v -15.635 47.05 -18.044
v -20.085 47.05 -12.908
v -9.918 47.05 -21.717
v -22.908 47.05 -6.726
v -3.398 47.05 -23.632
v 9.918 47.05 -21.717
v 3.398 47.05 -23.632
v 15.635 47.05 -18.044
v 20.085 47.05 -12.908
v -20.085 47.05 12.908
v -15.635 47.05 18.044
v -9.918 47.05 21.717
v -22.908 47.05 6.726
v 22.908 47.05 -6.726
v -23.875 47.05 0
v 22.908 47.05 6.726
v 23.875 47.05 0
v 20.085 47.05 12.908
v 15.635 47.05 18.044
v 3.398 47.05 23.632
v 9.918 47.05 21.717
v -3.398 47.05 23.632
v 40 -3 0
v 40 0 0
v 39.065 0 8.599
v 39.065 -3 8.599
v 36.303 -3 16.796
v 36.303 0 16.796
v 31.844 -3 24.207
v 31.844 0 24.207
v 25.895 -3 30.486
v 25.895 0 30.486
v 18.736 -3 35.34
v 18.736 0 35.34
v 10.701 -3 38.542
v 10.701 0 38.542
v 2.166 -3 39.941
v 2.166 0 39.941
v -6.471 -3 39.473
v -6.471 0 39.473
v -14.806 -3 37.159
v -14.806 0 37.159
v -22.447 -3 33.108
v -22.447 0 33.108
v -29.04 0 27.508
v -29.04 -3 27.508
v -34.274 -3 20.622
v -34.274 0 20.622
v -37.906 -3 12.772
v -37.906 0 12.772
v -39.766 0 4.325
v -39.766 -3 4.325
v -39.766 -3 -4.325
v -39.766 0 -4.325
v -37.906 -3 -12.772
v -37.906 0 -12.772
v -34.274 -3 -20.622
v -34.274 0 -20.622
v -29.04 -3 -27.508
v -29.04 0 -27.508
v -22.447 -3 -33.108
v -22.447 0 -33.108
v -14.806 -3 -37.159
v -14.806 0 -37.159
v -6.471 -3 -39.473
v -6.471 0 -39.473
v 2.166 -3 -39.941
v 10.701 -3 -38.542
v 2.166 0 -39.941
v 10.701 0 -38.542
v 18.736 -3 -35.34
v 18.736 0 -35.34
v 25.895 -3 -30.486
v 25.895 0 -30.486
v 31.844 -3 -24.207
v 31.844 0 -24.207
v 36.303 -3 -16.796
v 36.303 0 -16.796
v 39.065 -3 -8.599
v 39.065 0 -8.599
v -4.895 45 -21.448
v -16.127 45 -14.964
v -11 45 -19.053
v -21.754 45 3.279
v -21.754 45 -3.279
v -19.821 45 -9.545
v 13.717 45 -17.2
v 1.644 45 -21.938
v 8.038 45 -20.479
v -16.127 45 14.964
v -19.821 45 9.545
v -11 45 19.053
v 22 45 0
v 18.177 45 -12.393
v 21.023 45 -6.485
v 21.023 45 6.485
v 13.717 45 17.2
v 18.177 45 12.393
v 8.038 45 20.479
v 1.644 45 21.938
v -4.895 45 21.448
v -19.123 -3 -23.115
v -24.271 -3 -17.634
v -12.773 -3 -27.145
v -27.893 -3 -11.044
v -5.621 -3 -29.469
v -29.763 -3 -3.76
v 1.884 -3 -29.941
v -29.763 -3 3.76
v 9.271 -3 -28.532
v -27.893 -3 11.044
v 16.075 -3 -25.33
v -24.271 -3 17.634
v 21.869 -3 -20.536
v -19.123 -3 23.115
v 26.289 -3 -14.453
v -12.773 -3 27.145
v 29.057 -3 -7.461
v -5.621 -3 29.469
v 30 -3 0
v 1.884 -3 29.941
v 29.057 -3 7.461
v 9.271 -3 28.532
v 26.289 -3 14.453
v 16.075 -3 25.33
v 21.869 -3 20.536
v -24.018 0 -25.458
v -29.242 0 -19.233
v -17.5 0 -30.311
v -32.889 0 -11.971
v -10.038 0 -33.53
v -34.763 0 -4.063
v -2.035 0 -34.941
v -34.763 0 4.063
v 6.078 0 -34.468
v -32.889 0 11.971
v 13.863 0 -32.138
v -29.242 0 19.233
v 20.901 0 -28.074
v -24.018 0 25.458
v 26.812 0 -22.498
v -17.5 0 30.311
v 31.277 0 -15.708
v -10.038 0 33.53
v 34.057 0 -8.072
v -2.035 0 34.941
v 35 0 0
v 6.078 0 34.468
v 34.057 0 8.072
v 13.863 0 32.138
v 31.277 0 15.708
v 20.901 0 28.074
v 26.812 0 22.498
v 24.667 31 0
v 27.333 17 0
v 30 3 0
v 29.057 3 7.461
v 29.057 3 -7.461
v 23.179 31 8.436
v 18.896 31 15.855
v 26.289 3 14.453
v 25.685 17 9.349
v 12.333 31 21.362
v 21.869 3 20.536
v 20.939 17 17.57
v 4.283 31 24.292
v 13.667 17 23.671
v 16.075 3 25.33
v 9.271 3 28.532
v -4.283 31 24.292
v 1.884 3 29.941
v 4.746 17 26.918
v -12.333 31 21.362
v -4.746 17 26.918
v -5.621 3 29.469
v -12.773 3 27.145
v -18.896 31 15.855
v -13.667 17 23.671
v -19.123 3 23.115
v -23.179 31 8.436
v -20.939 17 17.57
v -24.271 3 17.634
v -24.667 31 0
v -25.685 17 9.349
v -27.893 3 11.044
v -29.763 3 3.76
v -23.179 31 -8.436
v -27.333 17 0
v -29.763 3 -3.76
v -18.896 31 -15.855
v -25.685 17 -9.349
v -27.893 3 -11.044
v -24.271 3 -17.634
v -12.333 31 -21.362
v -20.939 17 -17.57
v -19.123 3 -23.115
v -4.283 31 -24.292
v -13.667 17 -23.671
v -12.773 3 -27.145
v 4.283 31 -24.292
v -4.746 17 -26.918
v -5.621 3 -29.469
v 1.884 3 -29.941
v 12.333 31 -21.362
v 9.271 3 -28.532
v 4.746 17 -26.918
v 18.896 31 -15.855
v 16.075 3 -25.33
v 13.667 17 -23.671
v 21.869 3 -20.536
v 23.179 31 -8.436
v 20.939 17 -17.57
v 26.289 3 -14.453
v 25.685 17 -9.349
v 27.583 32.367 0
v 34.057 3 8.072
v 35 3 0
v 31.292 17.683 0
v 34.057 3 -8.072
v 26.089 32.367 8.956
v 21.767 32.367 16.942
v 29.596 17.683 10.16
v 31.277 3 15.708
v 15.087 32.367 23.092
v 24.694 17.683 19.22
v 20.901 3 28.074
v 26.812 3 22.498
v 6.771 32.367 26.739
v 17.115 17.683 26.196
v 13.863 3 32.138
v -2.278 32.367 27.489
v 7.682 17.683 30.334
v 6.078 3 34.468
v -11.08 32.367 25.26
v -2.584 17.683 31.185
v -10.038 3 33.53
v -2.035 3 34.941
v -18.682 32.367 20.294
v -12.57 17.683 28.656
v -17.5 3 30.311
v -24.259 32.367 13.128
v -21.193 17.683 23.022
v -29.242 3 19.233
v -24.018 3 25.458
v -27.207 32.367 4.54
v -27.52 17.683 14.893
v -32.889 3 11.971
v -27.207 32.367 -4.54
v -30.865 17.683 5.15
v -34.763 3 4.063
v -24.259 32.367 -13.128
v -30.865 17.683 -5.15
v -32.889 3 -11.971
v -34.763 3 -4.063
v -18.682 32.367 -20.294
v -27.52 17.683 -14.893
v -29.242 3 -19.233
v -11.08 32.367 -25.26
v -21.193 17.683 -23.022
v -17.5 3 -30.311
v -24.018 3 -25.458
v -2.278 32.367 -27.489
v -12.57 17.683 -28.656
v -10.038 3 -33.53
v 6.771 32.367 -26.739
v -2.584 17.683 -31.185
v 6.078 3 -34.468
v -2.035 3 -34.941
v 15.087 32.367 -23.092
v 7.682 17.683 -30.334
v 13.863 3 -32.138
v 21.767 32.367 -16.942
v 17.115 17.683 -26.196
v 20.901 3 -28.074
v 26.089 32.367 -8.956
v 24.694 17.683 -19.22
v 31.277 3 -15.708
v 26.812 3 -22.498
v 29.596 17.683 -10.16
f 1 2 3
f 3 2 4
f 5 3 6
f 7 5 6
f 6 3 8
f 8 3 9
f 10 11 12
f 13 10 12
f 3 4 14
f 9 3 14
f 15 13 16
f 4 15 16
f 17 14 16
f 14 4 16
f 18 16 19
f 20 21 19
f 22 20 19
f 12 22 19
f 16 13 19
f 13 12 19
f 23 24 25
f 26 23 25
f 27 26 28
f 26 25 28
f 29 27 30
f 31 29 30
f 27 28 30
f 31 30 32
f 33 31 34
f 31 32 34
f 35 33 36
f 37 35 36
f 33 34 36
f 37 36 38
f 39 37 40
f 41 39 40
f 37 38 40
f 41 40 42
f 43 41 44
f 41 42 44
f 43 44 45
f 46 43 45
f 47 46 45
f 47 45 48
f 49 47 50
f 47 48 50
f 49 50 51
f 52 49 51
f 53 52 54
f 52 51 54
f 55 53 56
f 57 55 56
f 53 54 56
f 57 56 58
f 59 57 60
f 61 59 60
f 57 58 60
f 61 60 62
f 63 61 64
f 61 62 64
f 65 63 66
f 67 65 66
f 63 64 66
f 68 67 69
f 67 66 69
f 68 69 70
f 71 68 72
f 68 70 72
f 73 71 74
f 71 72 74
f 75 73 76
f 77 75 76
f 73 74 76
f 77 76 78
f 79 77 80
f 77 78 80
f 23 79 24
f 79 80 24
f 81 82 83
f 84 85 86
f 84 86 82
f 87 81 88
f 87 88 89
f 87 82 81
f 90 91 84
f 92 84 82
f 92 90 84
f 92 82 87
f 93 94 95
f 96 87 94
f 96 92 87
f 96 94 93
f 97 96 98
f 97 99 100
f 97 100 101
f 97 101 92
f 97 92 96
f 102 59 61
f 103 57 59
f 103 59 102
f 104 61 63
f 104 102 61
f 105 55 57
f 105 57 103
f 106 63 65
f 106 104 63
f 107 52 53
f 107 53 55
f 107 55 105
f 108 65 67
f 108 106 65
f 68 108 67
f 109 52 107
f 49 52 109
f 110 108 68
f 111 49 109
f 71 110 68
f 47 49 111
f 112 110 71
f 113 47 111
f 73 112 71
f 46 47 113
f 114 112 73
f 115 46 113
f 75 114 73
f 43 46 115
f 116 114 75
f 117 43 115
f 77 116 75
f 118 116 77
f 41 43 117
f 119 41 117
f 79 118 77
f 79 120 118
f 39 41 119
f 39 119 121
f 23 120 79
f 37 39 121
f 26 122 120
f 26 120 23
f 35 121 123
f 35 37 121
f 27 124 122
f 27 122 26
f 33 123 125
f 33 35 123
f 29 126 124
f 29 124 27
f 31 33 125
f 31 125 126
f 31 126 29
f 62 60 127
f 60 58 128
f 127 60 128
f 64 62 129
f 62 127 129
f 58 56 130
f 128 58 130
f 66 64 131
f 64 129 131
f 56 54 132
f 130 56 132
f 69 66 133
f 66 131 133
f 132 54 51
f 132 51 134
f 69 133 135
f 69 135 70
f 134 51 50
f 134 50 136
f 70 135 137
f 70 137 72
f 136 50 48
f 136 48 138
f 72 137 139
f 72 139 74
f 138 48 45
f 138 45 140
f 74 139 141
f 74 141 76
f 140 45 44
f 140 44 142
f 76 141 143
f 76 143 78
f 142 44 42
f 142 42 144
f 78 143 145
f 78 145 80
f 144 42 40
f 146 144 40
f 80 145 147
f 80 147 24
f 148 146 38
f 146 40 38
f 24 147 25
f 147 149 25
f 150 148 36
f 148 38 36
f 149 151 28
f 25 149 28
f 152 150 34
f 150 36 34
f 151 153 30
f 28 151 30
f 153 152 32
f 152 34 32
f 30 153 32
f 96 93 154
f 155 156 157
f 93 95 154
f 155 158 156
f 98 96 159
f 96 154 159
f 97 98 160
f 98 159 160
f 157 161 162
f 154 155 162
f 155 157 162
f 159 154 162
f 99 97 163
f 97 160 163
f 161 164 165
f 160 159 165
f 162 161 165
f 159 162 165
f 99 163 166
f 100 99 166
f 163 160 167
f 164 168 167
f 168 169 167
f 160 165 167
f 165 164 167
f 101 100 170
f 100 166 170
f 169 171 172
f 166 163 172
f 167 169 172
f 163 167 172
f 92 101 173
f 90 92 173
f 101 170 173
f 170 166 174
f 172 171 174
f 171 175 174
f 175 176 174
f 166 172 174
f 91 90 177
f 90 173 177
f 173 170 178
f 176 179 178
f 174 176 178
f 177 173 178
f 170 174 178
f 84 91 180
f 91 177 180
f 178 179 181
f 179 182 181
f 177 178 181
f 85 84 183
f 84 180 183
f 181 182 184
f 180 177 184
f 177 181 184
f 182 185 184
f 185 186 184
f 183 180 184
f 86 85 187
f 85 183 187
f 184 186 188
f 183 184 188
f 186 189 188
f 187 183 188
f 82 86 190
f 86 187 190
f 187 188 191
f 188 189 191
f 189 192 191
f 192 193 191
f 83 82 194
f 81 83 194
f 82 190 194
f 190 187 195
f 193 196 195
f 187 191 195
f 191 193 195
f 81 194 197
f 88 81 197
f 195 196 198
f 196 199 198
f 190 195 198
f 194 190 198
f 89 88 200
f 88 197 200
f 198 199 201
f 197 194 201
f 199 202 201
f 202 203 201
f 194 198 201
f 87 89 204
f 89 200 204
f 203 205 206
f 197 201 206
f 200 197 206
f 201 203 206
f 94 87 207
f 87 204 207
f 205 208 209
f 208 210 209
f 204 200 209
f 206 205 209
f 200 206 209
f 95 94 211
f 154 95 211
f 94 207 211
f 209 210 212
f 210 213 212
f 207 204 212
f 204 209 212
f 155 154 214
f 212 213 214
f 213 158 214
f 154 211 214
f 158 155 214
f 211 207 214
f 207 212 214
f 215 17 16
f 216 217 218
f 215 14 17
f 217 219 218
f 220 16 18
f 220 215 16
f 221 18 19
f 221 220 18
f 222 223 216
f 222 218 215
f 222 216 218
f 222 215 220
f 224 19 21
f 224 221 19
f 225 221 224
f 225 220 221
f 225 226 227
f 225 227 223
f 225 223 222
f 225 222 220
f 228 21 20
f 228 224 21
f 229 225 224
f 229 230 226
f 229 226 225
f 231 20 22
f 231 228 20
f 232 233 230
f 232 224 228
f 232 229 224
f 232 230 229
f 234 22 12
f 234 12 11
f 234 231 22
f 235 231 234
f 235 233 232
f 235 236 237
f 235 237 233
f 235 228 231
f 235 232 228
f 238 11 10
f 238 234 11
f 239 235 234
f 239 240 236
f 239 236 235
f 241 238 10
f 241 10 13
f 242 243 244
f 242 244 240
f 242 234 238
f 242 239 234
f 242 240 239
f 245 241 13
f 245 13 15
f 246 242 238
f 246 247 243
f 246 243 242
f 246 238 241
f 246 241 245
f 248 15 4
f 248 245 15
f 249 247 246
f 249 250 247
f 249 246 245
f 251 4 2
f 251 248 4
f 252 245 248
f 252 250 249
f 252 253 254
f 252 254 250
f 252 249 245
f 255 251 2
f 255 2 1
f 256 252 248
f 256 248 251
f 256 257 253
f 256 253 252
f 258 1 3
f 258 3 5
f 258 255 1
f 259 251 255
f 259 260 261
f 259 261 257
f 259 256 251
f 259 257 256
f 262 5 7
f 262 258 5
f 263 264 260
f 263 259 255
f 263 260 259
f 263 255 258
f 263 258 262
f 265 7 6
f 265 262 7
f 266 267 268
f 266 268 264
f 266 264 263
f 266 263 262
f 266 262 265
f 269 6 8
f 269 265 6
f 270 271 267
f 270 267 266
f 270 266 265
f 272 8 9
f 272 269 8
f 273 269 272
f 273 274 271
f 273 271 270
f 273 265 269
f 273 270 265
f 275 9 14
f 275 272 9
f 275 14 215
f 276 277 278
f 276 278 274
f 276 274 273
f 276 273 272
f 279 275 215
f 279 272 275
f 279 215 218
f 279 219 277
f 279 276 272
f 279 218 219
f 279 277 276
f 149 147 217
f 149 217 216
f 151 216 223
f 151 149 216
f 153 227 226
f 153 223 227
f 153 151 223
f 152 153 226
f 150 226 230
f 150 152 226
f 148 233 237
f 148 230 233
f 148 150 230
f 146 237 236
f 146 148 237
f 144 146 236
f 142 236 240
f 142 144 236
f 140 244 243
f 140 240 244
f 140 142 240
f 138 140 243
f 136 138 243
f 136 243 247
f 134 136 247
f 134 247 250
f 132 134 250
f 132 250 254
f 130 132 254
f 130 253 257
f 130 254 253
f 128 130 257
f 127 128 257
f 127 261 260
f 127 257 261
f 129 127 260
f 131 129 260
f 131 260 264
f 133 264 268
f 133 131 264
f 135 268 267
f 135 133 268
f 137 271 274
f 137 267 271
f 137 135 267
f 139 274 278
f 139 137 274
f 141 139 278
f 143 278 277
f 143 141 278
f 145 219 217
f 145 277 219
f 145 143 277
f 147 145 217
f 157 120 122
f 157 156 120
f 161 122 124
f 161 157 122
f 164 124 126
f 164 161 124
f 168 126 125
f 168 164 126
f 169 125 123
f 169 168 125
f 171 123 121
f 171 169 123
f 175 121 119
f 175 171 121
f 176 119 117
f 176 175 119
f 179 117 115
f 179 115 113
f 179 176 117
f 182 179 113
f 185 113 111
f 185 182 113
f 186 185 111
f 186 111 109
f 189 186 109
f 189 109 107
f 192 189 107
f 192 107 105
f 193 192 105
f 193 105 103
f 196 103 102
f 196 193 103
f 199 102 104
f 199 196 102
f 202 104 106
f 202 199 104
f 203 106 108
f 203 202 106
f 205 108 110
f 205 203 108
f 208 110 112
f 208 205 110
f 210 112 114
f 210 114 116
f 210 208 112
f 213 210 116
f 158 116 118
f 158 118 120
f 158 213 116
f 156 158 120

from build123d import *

# Parameters (mm, degrees)
F0_R     = 40
F0_R_2   = 30
F1_DEPTH = 3
F2_R     = 35
F2_R_2   = 30
F3_DEPTH = 3
F5_R     = 23.875
F6_R     = 35
F9_R     = 22
F10_R    = 30


with BuildPart() as f1:
    # F0 (on Front) → F1 (new body)
    with BuildSketch(Plane.XZ):
        Circle(F0_R)
        Circle(F0_R_2, mode=Mode.SUBTRACT)
    extrude(amount=F1_DEPTH)

    # F2 (on Front) → F3 (join)
    with BuildSketch(Plane.XZ):
        Circle(F2_R)
        Circle(F2_R_2, mode=Mode.SUBTRACT)
    extrude(amount=-F3_DEPTH)

    # F5 (on offset) → F7 section 0
    with BuildSketch(Plane.XZ.offset(-47.05)):
        Circle(F5_R)
    # F6 (on face) → F7 section 1
    with BuildSketch(Plane(origin=(0, 3, 0), x_dir=(-1, 0, 0), z_dir=(0, 1, 0))):
        Circle(F6_R)
    loft()

    # F9 (on offset) → F11 section 0
    with BuildSketch(Plane.XZ.offset(-45)):
        Circle(F9_R)
    # F10 (on face) → F11 section 1
    with BuildSketch(Plane.XZ.offset(-3)):
        Circle(F10_R)
    loft(mode=Mode.SUBTRACT)


solid = f1.part
